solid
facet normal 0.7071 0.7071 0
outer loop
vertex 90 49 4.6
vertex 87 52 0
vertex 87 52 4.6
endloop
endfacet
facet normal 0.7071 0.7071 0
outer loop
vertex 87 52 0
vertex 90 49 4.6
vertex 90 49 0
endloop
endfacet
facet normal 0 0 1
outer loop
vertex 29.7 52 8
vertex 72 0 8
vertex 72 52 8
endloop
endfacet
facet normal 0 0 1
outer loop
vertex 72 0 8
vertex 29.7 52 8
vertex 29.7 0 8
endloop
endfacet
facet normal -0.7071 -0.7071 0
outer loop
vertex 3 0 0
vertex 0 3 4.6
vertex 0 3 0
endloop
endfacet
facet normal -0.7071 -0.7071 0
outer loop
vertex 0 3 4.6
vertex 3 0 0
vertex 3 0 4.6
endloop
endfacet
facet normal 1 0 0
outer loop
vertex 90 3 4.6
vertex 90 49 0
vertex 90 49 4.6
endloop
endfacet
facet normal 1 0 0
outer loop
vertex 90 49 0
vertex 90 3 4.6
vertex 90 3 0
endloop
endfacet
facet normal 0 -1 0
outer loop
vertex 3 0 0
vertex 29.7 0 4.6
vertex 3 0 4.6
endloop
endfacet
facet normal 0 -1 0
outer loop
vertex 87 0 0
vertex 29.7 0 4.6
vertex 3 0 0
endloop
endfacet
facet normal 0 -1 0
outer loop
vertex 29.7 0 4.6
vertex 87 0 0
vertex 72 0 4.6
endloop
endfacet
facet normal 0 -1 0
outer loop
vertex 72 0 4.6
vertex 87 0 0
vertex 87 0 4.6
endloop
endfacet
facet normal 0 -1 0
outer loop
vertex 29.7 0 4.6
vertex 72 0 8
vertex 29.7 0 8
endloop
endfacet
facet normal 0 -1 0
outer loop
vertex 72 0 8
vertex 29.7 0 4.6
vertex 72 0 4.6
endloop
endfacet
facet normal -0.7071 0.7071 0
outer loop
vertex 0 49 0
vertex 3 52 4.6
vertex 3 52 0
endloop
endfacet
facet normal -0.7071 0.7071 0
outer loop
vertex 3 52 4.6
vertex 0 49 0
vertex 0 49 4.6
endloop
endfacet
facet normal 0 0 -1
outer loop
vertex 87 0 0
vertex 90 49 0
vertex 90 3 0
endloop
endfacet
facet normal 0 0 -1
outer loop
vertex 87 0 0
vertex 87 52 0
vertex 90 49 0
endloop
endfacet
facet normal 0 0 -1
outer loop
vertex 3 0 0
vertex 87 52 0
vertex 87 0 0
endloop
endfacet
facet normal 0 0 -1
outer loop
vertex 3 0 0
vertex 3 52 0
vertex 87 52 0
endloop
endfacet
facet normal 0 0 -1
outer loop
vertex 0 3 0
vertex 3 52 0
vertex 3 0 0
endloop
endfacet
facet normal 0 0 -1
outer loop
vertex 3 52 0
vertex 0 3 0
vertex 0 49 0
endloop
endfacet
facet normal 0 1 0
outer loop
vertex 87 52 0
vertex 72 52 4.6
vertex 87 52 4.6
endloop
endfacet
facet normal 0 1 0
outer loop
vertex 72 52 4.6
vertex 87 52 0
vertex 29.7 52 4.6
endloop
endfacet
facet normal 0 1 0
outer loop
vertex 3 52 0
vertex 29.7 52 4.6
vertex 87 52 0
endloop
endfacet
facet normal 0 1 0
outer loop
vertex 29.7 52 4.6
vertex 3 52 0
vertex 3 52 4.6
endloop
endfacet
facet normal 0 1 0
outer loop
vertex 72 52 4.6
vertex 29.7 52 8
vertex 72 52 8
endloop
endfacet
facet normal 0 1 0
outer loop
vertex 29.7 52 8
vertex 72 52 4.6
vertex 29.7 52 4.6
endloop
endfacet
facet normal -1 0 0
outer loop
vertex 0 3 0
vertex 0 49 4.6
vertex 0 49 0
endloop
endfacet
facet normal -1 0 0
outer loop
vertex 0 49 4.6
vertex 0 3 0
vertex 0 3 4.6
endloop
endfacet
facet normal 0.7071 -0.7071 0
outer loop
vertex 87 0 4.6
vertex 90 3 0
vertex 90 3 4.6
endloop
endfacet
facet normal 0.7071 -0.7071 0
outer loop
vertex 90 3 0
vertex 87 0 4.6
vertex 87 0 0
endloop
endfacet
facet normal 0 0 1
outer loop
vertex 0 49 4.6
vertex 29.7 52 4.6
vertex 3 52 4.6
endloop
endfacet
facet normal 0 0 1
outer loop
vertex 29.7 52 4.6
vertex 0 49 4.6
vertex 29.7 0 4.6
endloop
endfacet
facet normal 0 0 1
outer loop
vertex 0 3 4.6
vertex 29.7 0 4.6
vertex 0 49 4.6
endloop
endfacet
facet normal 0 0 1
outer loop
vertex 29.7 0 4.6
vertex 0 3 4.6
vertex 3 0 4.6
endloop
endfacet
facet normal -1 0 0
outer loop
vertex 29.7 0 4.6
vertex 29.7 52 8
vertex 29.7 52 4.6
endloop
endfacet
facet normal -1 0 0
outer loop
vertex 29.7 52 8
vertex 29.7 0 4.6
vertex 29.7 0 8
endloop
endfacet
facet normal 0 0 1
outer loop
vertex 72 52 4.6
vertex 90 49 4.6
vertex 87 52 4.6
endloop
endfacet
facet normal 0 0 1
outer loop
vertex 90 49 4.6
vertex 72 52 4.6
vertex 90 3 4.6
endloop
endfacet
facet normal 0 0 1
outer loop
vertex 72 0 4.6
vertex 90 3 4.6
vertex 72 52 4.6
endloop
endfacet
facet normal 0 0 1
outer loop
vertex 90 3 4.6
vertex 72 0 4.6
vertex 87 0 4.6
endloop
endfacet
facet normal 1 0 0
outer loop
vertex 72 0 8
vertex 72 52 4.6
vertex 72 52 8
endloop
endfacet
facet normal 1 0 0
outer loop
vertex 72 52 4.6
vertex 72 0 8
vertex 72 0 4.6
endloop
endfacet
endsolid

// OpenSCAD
$fn = 32;

// ----------------------------------------------------------------------
// Stepped bar: centerstep, 90 x 52 x 8/4.6 mm
// ----------------------------------------------------------------------

// --- parameters (mm) ---
bar_l = 90;               // bar length, X
bar_w = 52;               // bar width, Y
plate_t = 8;              // thickness of the thick zone, Z
thin_t = 4.6;             // thickness of the thin zone
corner_c = 3;             // corner chamfer of the bar
step_cut = 3.4;           // material removed from the thin zone
thick_from = 29.7;        // start of the thick middle zone
thick_to = 72;            // end of the thick middle zone
depth_1 = 3.4;            // depth of cut 1 from the top face
depth_2 = 3.4;            // depth of cut 2 from the top face

profile = [[3, 0], [87, 0], [90, 3], [90, 49], [87, 52], [3, 52], [0, 49], [0, 3]];  // primary outline, 8 points, counter clockwise
void_1 = [[-1, -1], [29.7, -1], [29.7, 53], [-1, 53]];  // thin left end, 4 points
void_2 = [[72, -1], [91, -1], [91, 53], [72, 53]];  // thin right end, 4 points

// --- the one profile operation ---
difference() {
  linear_extrude(height = plate_t) polygon(points = profile);
  translate([0, 0, plate_t - depth_1])
    linear_extrude(height = depth_1 + 1) polygon(points = void_1);
  translate([0, 0, plate_t - depth_2])
    linear_extrude(height = depth_2 + 1) polygon(points = void_2);
}
